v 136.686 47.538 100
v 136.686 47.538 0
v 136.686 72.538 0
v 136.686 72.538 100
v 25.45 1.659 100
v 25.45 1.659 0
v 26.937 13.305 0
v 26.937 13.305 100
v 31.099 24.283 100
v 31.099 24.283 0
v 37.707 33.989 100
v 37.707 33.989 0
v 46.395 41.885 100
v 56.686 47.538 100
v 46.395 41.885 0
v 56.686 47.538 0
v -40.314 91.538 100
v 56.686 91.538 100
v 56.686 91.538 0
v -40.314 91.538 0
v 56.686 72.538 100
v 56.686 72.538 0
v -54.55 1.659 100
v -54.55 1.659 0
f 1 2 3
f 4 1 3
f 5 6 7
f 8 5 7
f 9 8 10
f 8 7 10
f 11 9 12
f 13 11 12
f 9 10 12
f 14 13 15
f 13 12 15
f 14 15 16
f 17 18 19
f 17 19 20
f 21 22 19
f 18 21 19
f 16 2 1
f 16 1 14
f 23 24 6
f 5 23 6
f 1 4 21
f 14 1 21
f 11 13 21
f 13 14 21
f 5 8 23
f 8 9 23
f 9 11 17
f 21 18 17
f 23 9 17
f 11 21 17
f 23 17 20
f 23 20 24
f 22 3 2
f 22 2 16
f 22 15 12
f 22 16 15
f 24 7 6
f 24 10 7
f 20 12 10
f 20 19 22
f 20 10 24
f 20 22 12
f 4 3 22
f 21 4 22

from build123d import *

# Parameters (mm, degrees)
BOSS_EXTRUDE1_DEPTH = 100
SKETCH3_W           = 80
SKETCH3_H           = 25
BOSS_EXTRUDE2_DEPTH = 100


with BuildPart() as part:
    # Sketch2 → Boss-Extrude1 (new body)
    with BuildSketch(Plane.XY):
        with BuildLine():
            Line((-54.549923262, 1.658687455), (25.450076738, 1.658687455))
            ThreePointArc((25.450076738, 1.658687455), (34.117239254, 29.330582003), (56.685613057, 47.538326449))
            Line((56.685613057, 47.538326449), (56.685613057, 91.538326449))
            Line((56.685613057, 91.538326449), (-40.314386943, 91.538326449))
            Line((-40.314386943, 91.538326449), (-54.549923262, 1.658687455))
        make_face()
    extrude(amount=BOSS_EXTRUDE1_DEPTH)

    # Sketch3 → Boss-Extrude2 (add)
    with BuildSketch(Plane(origin=(0, 0, 0), x_dir=(-1, 0, 0), z_dir=(0, 0, -1))):
        with Locations((-96.685613057, 60.038326449)):
            Rectangle(SKETCH3_W, SKETCH3_H)
    extrude(amount=-BOSS_EXTRUDE2_DEPTH)


solid = part.part
